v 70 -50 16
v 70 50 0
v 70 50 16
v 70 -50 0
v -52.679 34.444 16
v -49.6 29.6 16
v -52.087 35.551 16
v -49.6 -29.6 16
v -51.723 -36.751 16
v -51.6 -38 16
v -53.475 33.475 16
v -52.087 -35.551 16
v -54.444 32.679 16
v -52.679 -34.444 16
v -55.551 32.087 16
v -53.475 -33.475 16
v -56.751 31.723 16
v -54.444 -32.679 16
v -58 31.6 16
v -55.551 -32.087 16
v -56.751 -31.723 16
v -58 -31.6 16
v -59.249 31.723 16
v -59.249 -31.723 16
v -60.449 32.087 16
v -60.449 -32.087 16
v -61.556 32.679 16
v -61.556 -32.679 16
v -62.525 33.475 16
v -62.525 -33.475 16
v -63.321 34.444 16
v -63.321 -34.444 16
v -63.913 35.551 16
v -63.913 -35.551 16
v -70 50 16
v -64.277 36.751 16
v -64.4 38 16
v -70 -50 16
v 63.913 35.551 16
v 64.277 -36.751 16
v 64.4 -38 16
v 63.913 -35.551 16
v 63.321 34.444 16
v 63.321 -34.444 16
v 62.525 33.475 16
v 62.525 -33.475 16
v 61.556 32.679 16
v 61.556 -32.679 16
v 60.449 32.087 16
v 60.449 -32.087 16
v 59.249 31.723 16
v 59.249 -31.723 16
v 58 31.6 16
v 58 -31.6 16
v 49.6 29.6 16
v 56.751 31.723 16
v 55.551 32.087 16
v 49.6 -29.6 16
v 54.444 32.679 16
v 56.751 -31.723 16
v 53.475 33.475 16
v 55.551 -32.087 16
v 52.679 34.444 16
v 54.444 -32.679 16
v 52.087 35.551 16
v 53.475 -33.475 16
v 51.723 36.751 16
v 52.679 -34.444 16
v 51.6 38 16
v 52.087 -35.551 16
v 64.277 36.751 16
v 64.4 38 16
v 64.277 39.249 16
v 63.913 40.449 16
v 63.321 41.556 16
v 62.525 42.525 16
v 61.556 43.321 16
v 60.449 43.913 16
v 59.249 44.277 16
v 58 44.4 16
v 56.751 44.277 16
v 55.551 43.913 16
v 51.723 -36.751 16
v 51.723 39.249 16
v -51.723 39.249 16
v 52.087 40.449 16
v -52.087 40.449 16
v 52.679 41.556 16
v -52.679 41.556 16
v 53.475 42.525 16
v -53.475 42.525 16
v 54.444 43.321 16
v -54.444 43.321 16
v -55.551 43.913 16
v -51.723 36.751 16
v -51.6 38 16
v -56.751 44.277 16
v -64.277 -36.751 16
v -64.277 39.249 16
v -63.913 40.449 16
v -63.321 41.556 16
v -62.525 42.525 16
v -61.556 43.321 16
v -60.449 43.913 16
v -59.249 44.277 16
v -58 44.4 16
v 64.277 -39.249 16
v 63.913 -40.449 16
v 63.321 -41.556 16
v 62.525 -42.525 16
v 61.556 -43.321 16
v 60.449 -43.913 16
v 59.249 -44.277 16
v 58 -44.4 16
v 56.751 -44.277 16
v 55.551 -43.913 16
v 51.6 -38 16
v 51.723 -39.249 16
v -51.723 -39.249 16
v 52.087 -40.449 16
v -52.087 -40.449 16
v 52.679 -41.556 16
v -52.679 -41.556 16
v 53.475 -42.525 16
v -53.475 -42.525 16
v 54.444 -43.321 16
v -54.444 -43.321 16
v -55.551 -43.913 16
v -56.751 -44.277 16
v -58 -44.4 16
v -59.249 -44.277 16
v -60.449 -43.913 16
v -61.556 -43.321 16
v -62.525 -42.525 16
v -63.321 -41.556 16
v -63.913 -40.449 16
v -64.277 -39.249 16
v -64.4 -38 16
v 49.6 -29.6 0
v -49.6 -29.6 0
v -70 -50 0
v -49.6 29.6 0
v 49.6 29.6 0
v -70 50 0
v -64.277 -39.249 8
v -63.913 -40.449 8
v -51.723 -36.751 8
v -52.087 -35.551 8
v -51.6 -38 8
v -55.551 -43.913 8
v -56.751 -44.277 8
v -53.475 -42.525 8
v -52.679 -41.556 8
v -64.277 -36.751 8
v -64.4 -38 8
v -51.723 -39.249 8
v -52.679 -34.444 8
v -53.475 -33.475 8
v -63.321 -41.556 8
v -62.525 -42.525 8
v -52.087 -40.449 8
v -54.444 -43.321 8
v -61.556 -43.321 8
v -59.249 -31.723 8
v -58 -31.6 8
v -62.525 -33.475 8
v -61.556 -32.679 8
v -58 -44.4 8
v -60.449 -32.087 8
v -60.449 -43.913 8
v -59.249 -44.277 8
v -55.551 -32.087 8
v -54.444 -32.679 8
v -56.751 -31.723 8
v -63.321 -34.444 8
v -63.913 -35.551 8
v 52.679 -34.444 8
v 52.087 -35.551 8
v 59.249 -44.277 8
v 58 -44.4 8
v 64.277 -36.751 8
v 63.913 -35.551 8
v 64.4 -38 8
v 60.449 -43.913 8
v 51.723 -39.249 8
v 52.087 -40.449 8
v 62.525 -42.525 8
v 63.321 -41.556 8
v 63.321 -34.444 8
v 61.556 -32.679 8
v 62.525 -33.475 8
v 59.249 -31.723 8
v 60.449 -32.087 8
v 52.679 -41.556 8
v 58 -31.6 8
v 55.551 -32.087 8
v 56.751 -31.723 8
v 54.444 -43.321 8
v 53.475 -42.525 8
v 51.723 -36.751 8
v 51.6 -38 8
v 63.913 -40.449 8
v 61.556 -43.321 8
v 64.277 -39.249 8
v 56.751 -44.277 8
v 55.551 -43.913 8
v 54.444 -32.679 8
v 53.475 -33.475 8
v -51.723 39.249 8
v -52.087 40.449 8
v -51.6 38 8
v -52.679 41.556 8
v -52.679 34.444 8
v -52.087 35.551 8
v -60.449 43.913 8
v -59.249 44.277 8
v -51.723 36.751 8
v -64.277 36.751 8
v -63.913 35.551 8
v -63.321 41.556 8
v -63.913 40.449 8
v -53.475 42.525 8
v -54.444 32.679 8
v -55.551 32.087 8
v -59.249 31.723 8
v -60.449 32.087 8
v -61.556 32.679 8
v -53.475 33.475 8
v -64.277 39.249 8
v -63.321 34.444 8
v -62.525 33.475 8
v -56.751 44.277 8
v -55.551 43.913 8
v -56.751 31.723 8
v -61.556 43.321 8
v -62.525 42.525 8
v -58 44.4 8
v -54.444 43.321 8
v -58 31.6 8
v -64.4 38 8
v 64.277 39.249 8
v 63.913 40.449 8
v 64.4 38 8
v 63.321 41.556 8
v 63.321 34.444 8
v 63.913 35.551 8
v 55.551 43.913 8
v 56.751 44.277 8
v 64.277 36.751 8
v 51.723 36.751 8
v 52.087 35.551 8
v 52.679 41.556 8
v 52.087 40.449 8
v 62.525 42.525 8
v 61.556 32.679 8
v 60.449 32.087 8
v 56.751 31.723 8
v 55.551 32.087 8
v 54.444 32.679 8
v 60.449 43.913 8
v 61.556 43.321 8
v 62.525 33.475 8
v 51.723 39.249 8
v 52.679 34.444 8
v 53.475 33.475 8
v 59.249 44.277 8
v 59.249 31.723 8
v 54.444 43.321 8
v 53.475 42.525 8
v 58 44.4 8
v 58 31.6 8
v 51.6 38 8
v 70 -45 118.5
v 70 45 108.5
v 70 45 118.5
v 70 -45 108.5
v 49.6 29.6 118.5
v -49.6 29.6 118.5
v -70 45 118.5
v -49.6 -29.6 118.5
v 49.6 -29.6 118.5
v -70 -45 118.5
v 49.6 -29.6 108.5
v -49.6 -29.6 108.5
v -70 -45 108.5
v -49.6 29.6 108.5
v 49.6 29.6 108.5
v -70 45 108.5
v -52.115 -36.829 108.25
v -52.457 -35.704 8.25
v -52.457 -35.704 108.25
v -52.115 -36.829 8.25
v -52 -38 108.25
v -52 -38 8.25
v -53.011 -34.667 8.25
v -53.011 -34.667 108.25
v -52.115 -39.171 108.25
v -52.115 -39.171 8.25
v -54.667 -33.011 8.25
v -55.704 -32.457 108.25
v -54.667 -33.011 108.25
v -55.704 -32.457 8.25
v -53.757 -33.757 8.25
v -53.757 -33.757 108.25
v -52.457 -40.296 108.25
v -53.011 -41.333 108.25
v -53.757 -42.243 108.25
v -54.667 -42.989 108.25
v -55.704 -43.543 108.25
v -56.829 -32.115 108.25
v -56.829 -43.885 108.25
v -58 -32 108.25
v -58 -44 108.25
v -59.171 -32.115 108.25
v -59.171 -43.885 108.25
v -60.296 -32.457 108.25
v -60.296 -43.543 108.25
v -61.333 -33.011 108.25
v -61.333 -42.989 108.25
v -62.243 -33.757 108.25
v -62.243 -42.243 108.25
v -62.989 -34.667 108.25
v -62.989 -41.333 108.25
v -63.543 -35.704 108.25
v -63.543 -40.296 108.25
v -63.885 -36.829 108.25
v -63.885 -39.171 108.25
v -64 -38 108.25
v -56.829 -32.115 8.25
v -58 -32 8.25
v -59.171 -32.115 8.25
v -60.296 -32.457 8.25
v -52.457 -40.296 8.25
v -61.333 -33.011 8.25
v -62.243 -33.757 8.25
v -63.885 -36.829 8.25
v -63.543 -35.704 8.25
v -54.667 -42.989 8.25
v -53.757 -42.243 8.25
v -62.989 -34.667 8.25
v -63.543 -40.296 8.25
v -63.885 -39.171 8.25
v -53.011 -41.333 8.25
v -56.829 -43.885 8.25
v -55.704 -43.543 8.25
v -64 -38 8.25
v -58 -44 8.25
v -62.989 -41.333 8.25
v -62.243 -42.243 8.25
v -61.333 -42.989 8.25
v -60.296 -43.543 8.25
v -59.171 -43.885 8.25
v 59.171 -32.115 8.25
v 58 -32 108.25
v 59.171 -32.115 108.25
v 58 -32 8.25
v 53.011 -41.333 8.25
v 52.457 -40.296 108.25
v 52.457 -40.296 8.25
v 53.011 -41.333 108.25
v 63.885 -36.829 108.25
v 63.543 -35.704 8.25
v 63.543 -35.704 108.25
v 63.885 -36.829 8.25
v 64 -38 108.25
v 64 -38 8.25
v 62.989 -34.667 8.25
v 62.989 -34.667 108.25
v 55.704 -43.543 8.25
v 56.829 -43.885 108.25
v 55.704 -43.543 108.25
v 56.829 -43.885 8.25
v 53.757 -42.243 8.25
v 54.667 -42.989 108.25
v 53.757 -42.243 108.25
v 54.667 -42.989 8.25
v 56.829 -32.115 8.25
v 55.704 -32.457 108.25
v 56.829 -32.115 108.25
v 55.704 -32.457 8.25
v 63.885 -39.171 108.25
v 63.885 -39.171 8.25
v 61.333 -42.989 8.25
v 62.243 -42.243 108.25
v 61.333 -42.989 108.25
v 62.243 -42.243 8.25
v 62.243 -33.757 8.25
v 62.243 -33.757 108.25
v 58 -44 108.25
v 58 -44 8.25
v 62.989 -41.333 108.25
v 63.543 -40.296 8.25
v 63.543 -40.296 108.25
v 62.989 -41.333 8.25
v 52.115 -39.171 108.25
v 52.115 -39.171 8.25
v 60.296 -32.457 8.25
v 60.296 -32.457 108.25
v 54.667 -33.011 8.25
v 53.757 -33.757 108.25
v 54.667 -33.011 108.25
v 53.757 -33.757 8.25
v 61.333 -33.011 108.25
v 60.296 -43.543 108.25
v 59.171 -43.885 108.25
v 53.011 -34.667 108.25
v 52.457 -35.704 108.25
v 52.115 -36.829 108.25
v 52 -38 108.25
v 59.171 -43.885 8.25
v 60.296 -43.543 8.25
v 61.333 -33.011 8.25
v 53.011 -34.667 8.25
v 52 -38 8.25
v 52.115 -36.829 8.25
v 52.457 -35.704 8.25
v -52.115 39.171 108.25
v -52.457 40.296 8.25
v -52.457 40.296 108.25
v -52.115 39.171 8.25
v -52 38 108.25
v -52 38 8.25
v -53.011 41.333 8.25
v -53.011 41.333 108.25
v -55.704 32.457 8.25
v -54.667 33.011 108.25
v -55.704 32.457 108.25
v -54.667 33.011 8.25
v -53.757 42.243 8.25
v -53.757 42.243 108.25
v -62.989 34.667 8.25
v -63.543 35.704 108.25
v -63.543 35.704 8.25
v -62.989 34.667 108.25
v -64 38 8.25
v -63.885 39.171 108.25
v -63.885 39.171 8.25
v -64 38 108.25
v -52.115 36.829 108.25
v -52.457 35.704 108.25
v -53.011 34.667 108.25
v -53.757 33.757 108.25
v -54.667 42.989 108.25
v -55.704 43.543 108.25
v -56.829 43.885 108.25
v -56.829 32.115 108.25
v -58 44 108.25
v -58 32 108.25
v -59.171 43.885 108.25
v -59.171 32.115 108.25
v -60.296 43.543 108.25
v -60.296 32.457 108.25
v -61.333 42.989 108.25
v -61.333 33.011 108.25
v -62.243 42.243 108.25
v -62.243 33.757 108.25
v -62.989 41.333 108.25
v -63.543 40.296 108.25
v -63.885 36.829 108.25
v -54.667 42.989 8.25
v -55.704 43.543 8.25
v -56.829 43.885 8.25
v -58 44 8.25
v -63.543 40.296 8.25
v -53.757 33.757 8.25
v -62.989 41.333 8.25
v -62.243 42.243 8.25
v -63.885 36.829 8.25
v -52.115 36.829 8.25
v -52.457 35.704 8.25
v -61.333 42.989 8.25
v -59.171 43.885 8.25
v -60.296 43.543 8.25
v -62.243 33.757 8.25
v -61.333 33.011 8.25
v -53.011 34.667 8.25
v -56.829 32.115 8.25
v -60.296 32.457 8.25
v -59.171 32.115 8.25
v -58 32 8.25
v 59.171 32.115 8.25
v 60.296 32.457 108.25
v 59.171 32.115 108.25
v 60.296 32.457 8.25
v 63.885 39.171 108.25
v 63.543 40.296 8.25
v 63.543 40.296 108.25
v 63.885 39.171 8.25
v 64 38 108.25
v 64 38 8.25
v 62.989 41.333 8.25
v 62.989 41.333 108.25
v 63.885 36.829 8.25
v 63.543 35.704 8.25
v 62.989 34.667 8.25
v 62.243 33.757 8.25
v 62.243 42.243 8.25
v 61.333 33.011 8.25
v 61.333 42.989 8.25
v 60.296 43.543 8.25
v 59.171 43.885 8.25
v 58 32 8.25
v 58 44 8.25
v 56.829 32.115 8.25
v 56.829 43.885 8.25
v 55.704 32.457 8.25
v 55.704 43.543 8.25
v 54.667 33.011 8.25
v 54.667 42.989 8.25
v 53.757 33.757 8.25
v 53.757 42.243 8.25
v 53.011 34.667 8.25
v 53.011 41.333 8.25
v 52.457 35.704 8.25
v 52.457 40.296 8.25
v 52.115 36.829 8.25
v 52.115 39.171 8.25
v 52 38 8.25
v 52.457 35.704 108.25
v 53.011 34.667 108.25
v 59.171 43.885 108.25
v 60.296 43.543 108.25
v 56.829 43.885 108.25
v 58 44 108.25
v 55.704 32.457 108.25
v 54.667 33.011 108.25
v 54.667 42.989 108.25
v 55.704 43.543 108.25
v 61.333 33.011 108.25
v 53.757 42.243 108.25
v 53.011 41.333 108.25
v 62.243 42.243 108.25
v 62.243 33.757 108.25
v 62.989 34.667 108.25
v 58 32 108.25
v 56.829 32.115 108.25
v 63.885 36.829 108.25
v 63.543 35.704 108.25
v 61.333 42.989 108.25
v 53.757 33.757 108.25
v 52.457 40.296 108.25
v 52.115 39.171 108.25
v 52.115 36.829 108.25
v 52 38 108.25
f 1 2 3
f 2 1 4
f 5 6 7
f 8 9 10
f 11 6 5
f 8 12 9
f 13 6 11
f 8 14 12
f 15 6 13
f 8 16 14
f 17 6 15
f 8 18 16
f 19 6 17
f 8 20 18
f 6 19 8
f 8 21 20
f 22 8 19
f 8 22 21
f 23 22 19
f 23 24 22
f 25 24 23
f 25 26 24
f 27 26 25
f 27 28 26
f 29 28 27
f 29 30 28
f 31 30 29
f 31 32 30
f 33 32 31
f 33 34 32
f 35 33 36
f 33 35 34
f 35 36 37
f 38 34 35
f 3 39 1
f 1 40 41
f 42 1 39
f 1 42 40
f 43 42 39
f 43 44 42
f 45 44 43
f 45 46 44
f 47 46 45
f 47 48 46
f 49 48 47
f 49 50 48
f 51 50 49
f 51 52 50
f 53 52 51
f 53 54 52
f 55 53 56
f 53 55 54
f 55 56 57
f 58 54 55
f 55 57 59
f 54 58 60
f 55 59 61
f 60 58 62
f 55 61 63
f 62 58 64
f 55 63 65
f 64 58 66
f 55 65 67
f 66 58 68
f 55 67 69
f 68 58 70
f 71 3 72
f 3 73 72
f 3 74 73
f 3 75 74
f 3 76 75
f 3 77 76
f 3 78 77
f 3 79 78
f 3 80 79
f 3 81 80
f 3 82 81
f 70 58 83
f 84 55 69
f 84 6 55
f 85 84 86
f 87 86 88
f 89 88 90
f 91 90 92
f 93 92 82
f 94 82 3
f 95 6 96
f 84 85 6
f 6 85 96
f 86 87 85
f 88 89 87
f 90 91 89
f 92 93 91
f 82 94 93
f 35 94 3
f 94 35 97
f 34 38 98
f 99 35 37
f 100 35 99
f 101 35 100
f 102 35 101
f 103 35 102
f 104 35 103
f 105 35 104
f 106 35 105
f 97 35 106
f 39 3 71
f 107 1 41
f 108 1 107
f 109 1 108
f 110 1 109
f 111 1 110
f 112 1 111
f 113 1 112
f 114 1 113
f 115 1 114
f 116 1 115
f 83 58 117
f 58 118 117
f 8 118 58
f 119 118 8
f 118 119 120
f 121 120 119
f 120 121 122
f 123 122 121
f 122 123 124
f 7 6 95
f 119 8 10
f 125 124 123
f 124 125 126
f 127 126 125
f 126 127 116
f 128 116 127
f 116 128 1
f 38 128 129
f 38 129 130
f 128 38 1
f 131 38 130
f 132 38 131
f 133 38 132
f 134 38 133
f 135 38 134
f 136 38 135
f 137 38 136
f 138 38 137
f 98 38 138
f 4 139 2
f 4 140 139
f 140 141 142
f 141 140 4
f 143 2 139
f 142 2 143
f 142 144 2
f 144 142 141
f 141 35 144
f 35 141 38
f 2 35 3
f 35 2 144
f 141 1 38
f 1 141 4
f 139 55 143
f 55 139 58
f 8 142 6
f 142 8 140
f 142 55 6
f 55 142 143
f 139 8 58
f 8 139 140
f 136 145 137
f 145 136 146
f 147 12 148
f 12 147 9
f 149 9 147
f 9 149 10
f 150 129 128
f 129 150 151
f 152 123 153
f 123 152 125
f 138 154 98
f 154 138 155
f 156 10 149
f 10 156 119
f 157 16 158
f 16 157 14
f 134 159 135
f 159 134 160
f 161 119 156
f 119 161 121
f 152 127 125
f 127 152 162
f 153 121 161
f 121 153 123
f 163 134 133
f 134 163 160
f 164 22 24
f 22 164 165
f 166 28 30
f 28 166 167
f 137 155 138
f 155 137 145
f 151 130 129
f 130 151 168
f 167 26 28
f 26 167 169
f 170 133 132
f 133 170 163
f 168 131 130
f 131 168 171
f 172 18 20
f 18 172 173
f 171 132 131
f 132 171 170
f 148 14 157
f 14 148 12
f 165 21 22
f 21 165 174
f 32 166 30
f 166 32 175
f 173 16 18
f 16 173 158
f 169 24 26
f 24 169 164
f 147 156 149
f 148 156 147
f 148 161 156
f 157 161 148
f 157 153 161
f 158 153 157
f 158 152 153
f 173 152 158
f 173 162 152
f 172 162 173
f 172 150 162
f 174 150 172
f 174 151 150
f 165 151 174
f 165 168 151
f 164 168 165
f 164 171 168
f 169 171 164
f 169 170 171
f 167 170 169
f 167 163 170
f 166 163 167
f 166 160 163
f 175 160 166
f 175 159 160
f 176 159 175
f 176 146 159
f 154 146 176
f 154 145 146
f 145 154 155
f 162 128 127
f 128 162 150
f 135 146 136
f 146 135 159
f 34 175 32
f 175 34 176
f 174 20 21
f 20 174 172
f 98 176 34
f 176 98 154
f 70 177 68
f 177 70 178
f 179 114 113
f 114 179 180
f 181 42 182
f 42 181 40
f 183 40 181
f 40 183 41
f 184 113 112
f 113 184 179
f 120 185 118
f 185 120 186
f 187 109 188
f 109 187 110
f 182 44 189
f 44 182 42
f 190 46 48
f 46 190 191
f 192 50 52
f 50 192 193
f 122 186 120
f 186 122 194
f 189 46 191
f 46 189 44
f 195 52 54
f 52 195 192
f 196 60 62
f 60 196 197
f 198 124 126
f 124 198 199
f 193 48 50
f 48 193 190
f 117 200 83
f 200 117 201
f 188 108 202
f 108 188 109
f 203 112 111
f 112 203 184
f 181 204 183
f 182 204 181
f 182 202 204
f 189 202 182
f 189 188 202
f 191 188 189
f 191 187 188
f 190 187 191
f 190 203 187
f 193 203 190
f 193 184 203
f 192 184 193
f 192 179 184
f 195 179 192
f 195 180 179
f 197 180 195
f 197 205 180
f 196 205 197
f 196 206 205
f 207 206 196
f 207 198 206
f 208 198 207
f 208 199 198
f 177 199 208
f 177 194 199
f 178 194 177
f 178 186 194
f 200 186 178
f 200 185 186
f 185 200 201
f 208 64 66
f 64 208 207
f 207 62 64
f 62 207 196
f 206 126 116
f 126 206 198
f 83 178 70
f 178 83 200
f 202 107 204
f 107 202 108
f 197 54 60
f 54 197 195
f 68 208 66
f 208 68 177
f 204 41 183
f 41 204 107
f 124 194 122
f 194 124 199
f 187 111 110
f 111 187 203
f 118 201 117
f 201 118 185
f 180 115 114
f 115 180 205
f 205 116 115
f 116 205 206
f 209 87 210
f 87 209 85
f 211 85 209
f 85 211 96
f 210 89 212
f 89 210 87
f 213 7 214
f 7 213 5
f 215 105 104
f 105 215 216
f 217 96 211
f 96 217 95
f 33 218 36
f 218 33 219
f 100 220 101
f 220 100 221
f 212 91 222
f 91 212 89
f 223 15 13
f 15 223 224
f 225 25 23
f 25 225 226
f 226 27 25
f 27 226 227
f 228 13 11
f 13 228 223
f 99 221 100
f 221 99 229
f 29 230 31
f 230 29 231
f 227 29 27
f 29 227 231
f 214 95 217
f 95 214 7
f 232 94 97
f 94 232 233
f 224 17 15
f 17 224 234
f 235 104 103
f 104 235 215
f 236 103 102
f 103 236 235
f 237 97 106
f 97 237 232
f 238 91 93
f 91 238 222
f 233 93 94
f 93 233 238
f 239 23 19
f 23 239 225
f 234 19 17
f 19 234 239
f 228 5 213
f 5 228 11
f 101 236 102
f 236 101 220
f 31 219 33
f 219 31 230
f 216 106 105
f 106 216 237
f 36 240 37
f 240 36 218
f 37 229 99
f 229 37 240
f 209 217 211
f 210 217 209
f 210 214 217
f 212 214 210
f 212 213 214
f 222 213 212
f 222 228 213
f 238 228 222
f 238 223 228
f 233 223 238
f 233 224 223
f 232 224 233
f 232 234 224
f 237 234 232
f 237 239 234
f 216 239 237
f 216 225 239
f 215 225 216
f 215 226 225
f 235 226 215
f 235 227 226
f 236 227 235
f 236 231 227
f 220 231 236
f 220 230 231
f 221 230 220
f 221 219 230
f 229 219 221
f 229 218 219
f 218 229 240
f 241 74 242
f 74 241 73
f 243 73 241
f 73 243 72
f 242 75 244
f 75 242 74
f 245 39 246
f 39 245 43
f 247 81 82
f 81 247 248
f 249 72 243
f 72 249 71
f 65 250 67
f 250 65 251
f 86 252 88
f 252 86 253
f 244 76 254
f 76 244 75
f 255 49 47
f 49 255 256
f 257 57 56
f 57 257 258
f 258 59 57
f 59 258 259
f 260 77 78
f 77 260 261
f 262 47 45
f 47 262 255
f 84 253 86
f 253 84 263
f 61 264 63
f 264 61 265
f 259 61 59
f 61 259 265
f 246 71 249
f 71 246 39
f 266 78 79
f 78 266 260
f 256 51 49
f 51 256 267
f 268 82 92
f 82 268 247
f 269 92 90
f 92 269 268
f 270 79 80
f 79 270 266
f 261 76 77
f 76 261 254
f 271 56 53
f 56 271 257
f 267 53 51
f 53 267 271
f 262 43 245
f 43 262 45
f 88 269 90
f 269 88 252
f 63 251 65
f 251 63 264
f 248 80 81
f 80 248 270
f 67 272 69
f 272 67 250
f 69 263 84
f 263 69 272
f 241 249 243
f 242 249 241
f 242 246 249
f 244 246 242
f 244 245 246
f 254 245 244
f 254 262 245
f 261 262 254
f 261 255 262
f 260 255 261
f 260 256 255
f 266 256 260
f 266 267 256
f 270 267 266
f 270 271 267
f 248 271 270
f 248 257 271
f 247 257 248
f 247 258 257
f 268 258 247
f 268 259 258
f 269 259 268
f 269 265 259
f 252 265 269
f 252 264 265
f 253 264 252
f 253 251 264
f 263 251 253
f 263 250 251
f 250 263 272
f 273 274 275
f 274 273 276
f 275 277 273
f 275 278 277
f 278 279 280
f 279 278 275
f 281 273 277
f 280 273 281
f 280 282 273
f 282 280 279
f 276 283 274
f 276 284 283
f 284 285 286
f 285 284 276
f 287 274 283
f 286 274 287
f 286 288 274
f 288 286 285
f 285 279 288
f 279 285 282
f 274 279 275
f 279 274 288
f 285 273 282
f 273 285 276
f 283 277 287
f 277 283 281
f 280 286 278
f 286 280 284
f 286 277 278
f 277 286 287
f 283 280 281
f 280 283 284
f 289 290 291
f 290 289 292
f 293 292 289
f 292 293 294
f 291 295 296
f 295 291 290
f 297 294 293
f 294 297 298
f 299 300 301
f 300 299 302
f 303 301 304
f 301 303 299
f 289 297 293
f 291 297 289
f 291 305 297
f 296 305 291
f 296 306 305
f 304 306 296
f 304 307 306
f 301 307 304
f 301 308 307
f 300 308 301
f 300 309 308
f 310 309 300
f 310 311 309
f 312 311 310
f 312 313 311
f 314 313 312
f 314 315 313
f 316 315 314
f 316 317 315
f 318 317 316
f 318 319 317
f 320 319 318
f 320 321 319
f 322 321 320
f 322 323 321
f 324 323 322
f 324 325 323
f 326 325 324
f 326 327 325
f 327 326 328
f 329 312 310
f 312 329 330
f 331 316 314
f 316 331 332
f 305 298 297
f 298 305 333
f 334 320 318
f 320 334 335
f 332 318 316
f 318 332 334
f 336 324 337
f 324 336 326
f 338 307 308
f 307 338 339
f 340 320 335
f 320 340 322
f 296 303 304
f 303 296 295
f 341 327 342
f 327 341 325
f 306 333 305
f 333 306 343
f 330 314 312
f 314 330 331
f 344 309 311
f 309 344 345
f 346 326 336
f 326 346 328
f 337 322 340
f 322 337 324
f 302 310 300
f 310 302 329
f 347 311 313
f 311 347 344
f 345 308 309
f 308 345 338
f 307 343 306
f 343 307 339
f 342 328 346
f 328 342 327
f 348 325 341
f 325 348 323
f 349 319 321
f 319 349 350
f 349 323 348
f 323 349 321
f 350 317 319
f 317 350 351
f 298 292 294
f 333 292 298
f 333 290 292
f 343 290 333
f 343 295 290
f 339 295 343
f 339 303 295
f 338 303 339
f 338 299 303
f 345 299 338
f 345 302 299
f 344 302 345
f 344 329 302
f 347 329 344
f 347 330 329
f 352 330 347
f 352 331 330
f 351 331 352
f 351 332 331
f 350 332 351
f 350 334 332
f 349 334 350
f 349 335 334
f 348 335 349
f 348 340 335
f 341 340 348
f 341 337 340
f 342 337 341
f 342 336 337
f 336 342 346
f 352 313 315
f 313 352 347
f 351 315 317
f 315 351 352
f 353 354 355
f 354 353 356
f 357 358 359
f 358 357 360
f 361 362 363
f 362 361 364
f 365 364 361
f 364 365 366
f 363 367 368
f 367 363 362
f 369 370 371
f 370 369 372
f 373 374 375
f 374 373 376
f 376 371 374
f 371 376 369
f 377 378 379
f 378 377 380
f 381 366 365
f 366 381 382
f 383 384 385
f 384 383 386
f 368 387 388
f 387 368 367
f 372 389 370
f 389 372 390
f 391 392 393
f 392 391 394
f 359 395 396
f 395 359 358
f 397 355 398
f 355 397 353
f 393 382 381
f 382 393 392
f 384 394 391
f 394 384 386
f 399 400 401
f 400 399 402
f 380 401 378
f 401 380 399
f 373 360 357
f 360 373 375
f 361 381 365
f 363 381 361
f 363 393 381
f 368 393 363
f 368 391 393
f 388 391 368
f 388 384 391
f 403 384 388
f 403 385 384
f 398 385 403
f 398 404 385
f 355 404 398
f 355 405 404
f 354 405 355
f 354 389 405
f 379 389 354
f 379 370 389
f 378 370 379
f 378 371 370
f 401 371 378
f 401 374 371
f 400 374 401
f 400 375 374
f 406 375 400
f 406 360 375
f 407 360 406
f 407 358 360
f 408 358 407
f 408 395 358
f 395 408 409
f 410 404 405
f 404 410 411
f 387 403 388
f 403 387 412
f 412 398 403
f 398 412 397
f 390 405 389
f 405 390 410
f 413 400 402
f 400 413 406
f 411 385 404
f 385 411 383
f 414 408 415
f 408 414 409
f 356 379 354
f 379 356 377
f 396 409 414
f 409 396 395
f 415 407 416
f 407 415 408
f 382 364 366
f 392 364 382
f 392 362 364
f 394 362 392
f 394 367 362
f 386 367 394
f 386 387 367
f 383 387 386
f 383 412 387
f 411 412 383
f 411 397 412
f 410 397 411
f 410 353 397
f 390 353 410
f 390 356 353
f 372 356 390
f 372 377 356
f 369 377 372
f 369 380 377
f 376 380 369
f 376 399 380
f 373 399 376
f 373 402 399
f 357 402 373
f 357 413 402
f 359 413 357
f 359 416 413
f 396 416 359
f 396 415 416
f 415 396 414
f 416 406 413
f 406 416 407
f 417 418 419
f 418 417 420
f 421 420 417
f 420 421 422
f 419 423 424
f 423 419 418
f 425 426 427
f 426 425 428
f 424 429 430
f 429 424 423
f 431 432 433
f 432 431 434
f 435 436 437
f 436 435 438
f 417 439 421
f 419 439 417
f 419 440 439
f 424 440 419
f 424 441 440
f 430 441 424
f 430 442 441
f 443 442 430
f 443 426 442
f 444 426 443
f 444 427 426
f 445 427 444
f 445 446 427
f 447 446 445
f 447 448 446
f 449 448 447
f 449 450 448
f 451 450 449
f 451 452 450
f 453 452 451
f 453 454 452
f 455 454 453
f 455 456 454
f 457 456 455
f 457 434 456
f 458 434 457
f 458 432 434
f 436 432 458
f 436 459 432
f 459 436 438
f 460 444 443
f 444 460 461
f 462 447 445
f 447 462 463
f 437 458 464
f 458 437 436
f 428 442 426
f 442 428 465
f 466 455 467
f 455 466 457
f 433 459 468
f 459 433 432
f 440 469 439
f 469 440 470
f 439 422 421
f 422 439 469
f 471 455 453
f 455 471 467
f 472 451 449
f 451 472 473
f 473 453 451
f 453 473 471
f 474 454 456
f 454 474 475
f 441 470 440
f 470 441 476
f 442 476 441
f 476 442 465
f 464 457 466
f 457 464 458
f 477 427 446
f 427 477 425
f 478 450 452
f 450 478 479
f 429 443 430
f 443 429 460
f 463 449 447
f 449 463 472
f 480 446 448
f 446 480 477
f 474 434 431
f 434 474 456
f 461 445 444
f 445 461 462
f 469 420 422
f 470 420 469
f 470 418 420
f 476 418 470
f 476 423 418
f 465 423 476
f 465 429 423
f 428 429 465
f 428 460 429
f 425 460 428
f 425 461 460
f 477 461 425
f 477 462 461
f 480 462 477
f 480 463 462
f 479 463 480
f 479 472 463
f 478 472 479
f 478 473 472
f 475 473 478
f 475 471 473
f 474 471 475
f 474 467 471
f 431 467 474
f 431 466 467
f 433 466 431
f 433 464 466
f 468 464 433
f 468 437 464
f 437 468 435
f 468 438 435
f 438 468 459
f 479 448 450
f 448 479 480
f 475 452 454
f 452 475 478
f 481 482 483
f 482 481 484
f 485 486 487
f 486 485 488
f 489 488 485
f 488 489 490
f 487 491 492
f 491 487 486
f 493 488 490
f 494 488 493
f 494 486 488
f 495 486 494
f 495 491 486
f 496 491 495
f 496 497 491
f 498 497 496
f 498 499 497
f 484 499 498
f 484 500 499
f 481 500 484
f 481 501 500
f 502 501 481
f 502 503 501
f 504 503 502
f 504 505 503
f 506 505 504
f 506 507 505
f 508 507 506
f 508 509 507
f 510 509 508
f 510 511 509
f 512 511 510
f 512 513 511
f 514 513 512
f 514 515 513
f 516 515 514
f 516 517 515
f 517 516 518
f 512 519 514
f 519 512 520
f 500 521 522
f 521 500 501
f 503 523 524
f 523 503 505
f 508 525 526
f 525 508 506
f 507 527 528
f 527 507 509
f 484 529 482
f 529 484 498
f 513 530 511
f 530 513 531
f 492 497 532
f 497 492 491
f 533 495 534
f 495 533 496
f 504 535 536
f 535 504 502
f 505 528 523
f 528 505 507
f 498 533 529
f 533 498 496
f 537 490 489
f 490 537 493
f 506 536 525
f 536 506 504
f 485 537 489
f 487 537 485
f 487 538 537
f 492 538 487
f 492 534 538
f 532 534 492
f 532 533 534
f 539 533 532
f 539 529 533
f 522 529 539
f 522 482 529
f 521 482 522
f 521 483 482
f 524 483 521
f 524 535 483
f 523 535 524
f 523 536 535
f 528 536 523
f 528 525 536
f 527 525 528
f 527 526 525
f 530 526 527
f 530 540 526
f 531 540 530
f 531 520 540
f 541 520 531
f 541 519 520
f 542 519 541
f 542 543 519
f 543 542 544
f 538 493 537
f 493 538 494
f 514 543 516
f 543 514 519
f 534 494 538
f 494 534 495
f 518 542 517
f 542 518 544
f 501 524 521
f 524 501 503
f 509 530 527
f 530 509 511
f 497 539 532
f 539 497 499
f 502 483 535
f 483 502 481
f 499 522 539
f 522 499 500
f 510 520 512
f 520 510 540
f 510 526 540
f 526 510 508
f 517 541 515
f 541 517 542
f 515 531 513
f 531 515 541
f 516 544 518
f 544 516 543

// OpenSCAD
$fn = 32;

// ------------------------------------------------------------------------
// Frame cube: base 140 x 100 mm, posts 100 mm tall
// Every part is its own module, assembly() places every instance.
// ------------------------------------------------------------------------

// --- part 1 ---
module base_frame() {
  difference() {
    translate([-70, -50, 0]) cube([140, 100, 16]);
    translate([-49.6, -29.6, -1]) cube([99.2, 59.2, 18]);
    translate([-58, -38, 8]) cylinder(h = 9, d = 12.8);
    translate([58, -38, 8]) cylinder(h = 9, d = 12.8);
    translate([-58, 38, 8]) cylinder(h = 9, d = 12.8);
    translate([58, 38, 8]) cylinder(h = 9, d = 12.8);
  }
}

// --- part 2 ---
module corner_post() {
  cylinder(h = 100, d = 12);
}

// --- part 3 ---
module top_frame() {
  difference() {
    translate([-70, -45, 0]) cube([140, 90, 10]);
    translate([-49.6, -29.6, -1]) cube([99.2, 59.2, 12]);
  }
}

// --- assembly ---
module assembly() {
  color([0.80, 0.24, 0.20]) translate([0, 0, 0]) rotate([0, 0, 0]) base_frame();
  color([0.20, 0.45, 0.75]) translate([-58, -38, 8.25]) rotate([0, 0, 0]) corner_post();
  color([0.25, 0.62, 0.32]) translate([58, -38, 8.25]) rotate([0, 0, 0]) corner_post();
  color([0.92, 0.70, 0.18]) translate([-58, 38, 8.25]) rotate([0, 0, 0]) corner_post();
  color([0.58, 0.35, 0.70]) translate([58, 38, 8.25]) rotate([0, 0, 0]) corner_post();
  color([0.16, 0.66, 0.66]) translate([0, 0, 108.5]) rotate([0, 0, 0]) top_frame();
}

assembly();
